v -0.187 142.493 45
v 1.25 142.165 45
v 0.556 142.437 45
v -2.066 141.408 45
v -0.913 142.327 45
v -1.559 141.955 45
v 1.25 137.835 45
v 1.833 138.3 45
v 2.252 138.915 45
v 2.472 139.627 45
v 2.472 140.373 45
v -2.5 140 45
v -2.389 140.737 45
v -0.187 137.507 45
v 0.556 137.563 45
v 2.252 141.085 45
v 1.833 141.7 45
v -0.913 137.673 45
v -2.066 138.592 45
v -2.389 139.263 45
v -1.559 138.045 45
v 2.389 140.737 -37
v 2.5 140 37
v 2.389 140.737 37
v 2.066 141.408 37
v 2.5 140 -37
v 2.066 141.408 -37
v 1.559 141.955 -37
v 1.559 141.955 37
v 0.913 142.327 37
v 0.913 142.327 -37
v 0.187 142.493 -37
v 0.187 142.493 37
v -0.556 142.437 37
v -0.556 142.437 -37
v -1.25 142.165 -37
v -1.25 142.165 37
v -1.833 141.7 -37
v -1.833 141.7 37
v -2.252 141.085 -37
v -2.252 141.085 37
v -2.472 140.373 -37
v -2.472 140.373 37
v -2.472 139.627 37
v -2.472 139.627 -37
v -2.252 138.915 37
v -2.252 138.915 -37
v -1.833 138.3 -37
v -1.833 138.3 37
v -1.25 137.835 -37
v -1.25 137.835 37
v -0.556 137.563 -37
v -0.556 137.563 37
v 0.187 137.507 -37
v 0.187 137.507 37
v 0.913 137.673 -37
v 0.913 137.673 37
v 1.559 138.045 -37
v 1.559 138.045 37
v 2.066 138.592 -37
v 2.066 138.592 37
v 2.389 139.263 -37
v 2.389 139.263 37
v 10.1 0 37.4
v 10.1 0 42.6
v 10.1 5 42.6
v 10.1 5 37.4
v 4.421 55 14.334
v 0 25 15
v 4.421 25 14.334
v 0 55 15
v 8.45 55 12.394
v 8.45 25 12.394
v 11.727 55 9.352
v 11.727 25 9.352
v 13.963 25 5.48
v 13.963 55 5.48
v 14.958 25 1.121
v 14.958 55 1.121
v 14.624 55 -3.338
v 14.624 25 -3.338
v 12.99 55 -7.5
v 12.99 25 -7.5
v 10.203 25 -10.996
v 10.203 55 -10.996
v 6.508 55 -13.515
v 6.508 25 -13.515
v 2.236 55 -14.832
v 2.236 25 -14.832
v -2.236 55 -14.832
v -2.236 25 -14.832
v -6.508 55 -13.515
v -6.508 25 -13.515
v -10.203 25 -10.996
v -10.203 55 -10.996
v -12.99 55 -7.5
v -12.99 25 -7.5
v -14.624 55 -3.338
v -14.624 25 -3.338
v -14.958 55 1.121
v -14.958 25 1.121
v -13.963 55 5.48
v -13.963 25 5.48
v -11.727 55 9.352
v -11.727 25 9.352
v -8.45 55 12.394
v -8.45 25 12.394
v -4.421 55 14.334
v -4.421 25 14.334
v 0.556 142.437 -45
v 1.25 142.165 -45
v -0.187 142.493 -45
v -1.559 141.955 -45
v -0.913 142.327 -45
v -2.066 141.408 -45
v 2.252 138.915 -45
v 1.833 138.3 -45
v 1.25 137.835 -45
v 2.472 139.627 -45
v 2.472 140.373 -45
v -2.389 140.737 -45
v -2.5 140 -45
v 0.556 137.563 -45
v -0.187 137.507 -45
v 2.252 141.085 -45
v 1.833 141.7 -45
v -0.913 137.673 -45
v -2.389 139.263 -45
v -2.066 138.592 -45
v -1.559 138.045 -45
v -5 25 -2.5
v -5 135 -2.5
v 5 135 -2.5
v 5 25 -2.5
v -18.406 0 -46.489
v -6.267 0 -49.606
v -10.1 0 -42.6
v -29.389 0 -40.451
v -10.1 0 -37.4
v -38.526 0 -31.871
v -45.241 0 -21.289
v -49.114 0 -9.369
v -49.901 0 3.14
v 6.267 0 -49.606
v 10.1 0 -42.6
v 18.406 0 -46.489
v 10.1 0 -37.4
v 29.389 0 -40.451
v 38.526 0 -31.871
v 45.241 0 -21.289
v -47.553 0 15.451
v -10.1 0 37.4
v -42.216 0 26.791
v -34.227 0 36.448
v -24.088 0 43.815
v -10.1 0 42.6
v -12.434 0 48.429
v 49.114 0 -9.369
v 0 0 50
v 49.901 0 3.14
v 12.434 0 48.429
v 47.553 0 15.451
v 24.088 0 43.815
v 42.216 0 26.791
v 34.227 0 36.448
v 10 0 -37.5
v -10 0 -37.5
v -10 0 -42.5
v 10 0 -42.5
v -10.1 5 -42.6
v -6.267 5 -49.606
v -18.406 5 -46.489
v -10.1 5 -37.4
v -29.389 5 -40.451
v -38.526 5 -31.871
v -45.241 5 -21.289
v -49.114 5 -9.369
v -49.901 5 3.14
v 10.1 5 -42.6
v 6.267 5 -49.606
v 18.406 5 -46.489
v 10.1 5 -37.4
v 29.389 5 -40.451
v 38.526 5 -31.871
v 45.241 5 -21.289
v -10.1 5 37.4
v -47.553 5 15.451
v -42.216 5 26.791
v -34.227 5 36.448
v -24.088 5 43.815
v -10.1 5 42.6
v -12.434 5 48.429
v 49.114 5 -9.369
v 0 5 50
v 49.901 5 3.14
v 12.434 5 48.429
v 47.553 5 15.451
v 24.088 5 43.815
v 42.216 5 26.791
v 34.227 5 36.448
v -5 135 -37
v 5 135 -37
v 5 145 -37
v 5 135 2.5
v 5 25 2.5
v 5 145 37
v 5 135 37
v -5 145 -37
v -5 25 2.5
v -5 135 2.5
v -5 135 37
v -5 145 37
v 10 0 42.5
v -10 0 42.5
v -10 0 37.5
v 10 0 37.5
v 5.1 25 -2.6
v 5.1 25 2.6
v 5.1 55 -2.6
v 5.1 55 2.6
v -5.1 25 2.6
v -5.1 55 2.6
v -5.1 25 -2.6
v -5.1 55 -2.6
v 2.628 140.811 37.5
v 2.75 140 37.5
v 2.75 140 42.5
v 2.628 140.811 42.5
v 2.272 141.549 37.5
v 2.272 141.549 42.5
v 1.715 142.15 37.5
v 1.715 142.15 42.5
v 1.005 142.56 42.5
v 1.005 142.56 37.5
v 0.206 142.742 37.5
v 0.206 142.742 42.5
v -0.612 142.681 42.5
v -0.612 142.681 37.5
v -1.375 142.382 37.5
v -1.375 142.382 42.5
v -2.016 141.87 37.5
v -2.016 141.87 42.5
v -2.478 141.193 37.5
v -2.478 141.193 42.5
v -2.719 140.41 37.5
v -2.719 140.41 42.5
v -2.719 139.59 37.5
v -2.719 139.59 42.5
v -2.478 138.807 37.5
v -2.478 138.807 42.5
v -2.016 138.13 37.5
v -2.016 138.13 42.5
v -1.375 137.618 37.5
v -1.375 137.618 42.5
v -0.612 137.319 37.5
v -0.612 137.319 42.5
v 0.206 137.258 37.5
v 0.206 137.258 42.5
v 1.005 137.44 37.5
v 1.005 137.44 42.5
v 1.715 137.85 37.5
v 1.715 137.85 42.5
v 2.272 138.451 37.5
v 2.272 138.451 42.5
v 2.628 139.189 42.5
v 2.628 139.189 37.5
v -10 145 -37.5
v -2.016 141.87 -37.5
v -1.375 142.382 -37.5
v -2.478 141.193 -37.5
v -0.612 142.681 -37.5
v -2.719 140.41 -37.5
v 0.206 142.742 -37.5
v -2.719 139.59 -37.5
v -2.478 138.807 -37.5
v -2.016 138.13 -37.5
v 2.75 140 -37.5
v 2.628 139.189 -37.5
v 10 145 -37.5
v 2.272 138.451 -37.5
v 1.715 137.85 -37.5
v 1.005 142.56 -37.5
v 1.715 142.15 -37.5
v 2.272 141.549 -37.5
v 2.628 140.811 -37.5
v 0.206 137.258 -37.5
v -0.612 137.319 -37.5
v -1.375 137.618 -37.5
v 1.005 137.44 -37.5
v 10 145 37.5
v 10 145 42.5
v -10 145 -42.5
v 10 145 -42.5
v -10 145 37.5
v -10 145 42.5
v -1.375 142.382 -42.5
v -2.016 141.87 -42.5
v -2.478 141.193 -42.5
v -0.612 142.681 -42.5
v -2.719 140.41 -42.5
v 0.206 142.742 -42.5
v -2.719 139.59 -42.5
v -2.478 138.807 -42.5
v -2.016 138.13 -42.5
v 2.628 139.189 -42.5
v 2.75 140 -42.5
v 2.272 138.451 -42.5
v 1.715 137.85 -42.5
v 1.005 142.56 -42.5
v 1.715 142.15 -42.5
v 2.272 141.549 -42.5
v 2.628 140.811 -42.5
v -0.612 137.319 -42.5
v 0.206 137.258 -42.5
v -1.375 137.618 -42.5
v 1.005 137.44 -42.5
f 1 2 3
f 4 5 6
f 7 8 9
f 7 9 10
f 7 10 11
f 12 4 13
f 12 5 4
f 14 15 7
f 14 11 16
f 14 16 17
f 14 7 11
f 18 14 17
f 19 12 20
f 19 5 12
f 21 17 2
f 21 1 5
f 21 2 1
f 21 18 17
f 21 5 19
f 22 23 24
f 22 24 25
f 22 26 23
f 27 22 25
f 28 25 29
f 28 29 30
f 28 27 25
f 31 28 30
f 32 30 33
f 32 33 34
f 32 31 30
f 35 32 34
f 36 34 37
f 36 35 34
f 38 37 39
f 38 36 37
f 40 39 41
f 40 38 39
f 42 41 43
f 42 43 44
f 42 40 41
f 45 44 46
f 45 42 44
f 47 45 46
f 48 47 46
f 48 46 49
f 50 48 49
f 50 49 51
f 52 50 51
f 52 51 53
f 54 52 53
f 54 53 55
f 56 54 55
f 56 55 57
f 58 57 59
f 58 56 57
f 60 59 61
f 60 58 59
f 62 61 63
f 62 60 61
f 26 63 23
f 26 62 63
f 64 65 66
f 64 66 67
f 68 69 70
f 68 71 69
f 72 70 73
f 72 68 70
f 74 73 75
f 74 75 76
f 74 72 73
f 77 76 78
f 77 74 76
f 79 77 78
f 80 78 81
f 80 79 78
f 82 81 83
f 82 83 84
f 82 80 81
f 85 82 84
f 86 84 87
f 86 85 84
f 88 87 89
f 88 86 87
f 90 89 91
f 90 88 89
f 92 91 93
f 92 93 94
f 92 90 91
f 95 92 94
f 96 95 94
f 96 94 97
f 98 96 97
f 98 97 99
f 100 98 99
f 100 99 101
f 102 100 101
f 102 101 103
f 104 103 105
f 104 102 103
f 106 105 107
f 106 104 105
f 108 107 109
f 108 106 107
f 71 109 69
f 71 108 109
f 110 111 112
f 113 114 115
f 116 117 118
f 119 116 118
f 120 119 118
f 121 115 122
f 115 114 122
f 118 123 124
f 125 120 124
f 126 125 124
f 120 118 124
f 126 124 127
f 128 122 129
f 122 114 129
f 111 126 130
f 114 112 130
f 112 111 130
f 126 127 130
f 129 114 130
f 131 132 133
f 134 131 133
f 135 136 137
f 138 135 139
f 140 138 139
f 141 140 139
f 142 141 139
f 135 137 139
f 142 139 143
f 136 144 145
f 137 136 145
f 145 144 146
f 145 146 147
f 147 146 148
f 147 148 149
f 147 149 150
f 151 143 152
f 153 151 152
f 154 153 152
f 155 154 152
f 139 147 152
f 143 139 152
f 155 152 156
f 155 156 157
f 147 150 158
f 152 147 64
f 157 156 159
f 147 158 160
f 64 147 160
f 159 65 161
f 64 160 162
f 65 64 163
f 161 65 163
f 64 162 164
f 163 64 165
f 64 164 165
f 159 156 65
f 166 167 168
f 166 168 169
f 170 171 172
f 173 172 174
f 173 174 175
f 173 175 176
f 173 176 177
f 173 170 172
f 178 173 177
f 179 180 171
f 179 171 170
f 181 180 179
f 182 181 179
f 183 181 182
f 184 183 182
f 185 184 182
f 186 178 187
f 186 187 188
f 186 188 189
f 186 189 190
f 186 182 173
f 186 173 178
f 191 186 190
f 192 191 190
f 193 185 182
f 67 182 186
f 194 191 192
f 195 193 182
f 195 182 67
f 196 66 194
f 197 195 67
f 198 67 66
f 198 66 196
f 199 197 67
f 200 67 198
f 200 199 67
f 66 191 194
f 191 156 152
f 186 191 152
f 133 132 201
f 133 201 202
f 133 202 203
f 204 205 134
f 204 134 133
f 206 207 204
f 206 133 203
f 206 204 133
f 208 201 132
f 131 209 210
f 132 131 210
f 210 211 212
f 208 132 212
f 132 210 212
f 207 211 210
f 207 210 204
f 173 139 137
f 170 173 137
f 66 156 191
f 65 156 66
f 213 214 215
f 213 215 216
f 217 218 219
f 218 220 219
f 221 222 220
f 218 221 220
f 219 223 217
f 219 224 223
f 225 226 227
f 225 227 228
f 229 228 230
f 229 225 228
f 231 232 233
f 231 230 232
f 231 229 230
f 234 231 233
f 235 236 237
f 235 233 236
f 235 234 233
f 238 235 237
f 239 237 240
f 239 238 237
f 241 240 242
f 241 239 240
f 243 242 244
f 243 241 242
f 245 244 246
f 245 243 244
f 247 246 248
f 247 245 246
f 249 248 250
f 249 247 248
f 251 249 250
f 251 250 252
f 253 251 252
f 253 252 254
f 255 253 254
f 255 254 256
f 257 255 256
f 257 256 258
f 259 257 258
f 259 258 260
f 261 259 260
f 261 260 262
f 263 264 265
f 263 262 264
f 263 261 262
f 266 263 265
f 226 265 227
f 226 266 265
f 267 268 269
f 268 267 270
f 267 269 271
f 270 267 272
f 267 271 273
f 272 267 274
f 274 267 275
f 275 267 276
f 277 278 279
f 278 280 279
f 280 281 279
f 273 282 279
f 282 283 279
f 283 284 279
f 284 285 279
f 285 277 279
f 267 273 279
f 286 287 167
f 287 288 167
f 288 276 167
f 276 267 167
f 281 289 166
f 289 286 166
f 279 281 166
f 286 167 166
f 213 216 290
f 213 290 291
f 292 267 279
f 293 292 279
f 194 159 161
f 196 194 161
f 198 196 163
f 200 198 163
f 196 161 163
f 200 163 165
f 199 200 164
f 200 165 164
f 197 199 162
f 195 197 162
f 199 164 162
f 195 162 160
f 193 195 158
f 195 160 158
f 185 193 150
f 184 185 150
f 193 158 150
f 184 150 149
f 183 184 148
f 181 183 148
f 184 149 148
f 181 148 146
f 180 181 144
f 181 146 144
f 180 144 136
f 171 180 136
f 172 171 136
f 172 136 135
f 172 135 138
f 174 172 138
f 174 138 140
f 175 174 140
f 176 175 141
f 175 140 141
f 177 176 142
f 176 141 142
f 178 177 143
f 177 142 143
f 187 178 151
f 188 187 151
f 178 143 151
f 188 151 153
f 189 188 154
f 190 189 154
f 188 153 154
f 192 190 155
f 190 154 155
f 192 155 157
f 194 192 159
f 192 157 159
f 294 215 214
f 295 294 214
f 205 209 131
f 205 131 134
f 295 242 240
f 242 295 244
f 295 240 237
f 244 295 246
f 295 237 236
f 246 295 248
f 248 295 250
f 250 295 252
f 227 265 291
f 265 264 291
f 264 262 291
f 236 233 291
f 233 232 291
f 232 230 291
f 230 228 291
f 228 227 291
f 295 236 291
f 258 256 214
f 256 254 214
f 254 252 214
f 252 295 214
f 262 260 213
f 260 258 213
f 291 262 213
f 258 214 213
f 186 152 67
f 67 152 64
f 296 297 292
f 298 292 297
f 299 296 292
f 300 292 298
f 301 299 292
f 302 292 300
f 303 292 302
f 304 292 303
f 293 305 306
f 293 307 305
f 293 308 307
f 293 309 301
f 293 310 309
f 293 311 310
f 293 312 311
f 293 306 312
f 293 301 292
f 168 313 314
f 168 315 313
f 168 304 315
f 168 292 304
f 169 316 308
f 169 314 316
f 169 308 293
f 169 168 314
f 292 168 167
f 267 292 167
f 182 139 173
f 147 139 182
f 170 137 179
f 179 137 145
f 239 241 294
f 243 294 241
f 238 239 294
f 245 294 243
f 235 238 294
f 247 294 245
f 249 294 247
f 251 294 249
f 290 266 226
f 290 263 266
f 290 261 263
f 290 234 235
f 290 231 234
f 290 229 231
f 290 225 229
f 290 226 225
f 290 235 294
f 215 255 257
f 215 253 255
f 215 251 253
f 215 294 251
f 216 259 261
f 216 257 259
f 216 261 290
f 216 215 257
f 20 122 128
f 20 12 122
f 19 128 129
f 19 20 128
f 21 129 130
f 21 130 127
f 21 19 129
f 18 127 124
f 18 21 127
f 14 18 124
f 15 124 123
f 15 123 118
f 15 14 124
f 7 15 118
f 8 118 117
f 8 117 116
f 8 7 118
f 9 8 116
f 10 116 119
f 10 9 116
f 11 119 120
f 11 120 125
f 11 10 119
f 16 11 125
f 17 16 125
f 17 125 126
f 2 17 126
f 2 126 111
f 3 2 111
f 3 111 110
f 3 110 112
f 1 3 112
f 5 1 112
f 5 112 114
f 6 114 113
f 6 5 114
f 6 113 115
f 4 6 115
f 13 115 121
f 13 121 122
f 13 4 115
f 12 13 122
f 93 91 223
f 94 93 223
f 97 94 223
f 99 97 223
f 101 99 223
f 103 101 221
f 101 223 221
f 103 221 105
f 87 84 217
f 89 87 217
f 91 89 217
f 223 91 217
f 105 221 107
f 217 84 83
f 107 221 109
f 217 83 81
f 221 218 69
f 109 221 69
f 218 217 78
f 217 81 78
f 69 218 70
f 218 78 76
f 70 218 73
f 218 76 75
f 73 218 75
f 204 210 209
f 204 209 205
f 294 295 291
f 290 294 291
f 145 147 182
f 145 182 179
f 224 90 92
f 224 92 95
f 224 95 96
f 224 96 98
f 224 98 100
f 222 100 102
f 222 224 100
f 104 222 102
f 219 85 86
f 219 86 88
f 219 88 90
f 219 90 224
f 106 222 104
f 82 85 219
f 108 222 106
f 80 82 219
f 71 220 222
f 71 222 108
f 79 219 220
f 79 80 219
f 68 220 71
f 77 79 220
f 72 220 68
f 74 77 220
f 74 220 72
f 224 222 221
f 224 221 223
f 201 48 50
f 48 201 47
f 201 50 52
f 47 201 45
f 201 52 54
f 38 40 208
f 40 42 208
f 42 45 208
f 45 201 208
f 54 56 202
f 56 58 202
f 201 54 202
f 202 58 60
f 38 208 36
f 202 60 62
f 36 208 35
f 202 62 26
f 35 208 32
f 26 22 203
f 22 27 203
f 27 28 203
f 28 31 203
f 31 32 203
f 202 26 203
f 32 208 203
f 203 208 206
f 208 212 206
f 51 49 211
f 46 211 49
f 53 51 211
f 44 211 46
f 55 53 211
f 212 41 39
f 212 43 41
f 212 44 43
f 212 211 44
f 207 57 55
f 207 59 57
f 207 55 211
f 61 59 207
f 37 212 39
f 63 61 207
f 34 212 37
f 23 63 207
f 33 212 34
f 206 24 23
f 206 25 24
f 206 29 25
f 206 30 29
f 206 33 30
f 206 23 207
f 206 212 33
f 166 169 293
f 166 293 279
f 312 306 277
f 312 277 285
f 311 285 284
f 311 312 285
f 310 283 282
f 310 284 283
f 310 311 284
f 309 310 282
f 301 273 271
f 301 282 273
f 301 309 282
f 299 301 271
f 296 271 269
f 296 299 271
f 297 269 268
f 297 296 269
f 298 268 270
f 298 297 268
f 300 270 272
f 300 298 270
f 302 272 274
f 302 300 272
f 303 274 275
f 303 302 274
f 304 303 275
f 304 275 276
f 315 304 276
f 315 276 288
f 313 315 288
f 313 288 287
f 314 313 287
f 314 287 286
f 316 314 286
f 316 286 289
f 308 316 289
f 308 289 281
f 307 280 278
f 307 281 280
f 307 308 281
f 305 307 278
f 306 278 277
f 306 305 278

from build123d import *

# Parameters (mm, degrees)
SKETCH1_R               = 50
SKETCH1_W               = 20.2
SKETCH1_H               = 5.2
BOSS_EXTRUDE1_DEPTH     = 5
SKETCH2_W               = 20
SKETCH2_H               = 5
BOSS_EXTRUDE2_DEPTH     = 145
BOSS_EXTRUDE2_2_DEPTH   = 145
CUT_EXTRUDE1_DEPTH      = 162.322658049
CUT_EXTRUDE1_DEPTH_BACK = 162.322658049
SKETCH3_R               = 2.75
SKETCH4_R               = 2.5
BOSS_EXTRUDE3_DEPTH     = 45
SKETCH5_W               = 10
SKETCH5_H               = 10
SKETCH5_R               = 2.5
BOSS_EXTRUDE4_DEPTH     = 37
SKETCH10_W              = 10
SKETCH10_H              = 110
BOSS_EXTRUDE7_DEPTH     = 2.5
SKETCH11_R              = 15
SKETCH11_W              = 10.2
SKETCH11_H              = 5.2
BOSS_EXTRUDE8_DEPTH     = 15


with BuildPart() as part:
    # Sketch1 → Boss-Extrude1 (new body)
    with BuildSketch(Plane(origin=(0, 0, 0), x_dir=(1, 0, 0), z_dir=(0, 1, 0))):
        with Locations(Location((0, 0, 0), (0, 0, 270))):
            Circle(SKETCH1_R)
        with Locations((0, 40)):
            Rectangle(SKETCH1_W, SKETCH1_H, mode=Mode.SUBTRACT)
        with Locations((0, -40)):
            Rectangle(SKETCH1_W, SKETCH1_H, mode=Mode.SUBTRACT)
    extrude(amount=BOSS_EXTRUDE1_DEPTH)


with BuildPart() as body_2:
    # Sketch2 → Boss-Extrude2 (new body)
    with BuildSketch(Plane.XZ):
        with Locations((0, 40)):
            Rectangle(SKETCH2_W, SKETCH2_H)
    extrude(amount=-BOSS_EXTRUDE2_DEPTH)


with BuildPart() as body_3:
    # Sketch2 → Boss-Extrude2 2 (new body)
    with BuildSketch(Plane.XZ):
        with Locations((0, -40)):
            Rectangle(SKETCH2_W, SKETCH2_H)
    extrude(amount=-BOSS_EXTRUDE2_2_DEPTH)


with BuildPart() as cut_extrude1_tool:
    # Sketch3 → Cut-Extrude1 (new, two sides: drawn at the far end of the back side and taken through both)
    with BuildSketch(Plane.XY.offset(-CUT_EXTRUDE1_DEPTH_BACK)):
        with Locations((0, 140)):
            Circle(SKETCH3_R)
    extrude(amount=CUT_EXTRUDE1_DEPTH + CUT_EXTRUDE1_DEPTH_BACK)


with BuildPart() as body_2_1:
    add(body_2.part)

    # Cut-Extrude1: cut by cut_extrude1_tool
    add(cut_extrude1_tool.part, mode=Mode.SUBTRACT)


with BuildPart() as body_3_1:
    add(body_3.part)

    # Cut-Extrude1: cut by cut_extrude1_tool
    add(cut_extrude1_tool.part, mode=Mode.SUBTRACT)


with BuildPart() as body_4:
    # Sketch4 → Boss-Extrude3 (new, symmetric)
    with BuildSketch(Plane.XY):
        with Locations(Location((0, 140, 0), (0, 0, 180))):
            Circle(SKETCH4_R)
    extrude(amount=BOSS_EXTRUDE3_DEPTH, both=True)


with BuildPart() as body_5:
    # Sketch5 → Boss-Extrude4 (new, symmetric)
    with BuildSketch(Plane.XY):
        with Locations((0, 140)):
            Rectangle(SKETCH5_W, SKETCH5_H)
        with Locations((0, 140)):
            Circle(SKETCH5_R, mode=Mode.SUBTRACT)
    extrude(amount=BOSS_EXTRUDE4_DEPTH, both=True)

    # Sketch10 → Boss-Extrude7 (add, symmetric)
    with BuildSketch(Plane.XY):
        with Locations((0, 80)):
            Rectangle(SKETCH10_W, SKETCH10_H)
    extrude(amount=BOSS_EXTRUDE7_DEPTH, both=True)


with BuildPart() as body_6:
    # Sketch11 → Boss-Extrude8 (new, symmetric)
    with BuildSketch(Plane(origin=(0, 40, 0), x_dir=(1, 0, 0), z_dir=(0, 1, 0))):
        with Locations(Location((0, 0, 0), (0, 0, 270))):
            Circle(SKETCH11_R)
        Rectangle(SKETCH11_W, SKETCH11_H, mode=Mode.SUBTRACT)
    extrude(amount=BOSS_EXTRUDE8_DEPTH, both=True)


solid = Compound([part.part, body_2_1.part, body_3_1.part, body_4.part, body_5.part, body_6.part])
